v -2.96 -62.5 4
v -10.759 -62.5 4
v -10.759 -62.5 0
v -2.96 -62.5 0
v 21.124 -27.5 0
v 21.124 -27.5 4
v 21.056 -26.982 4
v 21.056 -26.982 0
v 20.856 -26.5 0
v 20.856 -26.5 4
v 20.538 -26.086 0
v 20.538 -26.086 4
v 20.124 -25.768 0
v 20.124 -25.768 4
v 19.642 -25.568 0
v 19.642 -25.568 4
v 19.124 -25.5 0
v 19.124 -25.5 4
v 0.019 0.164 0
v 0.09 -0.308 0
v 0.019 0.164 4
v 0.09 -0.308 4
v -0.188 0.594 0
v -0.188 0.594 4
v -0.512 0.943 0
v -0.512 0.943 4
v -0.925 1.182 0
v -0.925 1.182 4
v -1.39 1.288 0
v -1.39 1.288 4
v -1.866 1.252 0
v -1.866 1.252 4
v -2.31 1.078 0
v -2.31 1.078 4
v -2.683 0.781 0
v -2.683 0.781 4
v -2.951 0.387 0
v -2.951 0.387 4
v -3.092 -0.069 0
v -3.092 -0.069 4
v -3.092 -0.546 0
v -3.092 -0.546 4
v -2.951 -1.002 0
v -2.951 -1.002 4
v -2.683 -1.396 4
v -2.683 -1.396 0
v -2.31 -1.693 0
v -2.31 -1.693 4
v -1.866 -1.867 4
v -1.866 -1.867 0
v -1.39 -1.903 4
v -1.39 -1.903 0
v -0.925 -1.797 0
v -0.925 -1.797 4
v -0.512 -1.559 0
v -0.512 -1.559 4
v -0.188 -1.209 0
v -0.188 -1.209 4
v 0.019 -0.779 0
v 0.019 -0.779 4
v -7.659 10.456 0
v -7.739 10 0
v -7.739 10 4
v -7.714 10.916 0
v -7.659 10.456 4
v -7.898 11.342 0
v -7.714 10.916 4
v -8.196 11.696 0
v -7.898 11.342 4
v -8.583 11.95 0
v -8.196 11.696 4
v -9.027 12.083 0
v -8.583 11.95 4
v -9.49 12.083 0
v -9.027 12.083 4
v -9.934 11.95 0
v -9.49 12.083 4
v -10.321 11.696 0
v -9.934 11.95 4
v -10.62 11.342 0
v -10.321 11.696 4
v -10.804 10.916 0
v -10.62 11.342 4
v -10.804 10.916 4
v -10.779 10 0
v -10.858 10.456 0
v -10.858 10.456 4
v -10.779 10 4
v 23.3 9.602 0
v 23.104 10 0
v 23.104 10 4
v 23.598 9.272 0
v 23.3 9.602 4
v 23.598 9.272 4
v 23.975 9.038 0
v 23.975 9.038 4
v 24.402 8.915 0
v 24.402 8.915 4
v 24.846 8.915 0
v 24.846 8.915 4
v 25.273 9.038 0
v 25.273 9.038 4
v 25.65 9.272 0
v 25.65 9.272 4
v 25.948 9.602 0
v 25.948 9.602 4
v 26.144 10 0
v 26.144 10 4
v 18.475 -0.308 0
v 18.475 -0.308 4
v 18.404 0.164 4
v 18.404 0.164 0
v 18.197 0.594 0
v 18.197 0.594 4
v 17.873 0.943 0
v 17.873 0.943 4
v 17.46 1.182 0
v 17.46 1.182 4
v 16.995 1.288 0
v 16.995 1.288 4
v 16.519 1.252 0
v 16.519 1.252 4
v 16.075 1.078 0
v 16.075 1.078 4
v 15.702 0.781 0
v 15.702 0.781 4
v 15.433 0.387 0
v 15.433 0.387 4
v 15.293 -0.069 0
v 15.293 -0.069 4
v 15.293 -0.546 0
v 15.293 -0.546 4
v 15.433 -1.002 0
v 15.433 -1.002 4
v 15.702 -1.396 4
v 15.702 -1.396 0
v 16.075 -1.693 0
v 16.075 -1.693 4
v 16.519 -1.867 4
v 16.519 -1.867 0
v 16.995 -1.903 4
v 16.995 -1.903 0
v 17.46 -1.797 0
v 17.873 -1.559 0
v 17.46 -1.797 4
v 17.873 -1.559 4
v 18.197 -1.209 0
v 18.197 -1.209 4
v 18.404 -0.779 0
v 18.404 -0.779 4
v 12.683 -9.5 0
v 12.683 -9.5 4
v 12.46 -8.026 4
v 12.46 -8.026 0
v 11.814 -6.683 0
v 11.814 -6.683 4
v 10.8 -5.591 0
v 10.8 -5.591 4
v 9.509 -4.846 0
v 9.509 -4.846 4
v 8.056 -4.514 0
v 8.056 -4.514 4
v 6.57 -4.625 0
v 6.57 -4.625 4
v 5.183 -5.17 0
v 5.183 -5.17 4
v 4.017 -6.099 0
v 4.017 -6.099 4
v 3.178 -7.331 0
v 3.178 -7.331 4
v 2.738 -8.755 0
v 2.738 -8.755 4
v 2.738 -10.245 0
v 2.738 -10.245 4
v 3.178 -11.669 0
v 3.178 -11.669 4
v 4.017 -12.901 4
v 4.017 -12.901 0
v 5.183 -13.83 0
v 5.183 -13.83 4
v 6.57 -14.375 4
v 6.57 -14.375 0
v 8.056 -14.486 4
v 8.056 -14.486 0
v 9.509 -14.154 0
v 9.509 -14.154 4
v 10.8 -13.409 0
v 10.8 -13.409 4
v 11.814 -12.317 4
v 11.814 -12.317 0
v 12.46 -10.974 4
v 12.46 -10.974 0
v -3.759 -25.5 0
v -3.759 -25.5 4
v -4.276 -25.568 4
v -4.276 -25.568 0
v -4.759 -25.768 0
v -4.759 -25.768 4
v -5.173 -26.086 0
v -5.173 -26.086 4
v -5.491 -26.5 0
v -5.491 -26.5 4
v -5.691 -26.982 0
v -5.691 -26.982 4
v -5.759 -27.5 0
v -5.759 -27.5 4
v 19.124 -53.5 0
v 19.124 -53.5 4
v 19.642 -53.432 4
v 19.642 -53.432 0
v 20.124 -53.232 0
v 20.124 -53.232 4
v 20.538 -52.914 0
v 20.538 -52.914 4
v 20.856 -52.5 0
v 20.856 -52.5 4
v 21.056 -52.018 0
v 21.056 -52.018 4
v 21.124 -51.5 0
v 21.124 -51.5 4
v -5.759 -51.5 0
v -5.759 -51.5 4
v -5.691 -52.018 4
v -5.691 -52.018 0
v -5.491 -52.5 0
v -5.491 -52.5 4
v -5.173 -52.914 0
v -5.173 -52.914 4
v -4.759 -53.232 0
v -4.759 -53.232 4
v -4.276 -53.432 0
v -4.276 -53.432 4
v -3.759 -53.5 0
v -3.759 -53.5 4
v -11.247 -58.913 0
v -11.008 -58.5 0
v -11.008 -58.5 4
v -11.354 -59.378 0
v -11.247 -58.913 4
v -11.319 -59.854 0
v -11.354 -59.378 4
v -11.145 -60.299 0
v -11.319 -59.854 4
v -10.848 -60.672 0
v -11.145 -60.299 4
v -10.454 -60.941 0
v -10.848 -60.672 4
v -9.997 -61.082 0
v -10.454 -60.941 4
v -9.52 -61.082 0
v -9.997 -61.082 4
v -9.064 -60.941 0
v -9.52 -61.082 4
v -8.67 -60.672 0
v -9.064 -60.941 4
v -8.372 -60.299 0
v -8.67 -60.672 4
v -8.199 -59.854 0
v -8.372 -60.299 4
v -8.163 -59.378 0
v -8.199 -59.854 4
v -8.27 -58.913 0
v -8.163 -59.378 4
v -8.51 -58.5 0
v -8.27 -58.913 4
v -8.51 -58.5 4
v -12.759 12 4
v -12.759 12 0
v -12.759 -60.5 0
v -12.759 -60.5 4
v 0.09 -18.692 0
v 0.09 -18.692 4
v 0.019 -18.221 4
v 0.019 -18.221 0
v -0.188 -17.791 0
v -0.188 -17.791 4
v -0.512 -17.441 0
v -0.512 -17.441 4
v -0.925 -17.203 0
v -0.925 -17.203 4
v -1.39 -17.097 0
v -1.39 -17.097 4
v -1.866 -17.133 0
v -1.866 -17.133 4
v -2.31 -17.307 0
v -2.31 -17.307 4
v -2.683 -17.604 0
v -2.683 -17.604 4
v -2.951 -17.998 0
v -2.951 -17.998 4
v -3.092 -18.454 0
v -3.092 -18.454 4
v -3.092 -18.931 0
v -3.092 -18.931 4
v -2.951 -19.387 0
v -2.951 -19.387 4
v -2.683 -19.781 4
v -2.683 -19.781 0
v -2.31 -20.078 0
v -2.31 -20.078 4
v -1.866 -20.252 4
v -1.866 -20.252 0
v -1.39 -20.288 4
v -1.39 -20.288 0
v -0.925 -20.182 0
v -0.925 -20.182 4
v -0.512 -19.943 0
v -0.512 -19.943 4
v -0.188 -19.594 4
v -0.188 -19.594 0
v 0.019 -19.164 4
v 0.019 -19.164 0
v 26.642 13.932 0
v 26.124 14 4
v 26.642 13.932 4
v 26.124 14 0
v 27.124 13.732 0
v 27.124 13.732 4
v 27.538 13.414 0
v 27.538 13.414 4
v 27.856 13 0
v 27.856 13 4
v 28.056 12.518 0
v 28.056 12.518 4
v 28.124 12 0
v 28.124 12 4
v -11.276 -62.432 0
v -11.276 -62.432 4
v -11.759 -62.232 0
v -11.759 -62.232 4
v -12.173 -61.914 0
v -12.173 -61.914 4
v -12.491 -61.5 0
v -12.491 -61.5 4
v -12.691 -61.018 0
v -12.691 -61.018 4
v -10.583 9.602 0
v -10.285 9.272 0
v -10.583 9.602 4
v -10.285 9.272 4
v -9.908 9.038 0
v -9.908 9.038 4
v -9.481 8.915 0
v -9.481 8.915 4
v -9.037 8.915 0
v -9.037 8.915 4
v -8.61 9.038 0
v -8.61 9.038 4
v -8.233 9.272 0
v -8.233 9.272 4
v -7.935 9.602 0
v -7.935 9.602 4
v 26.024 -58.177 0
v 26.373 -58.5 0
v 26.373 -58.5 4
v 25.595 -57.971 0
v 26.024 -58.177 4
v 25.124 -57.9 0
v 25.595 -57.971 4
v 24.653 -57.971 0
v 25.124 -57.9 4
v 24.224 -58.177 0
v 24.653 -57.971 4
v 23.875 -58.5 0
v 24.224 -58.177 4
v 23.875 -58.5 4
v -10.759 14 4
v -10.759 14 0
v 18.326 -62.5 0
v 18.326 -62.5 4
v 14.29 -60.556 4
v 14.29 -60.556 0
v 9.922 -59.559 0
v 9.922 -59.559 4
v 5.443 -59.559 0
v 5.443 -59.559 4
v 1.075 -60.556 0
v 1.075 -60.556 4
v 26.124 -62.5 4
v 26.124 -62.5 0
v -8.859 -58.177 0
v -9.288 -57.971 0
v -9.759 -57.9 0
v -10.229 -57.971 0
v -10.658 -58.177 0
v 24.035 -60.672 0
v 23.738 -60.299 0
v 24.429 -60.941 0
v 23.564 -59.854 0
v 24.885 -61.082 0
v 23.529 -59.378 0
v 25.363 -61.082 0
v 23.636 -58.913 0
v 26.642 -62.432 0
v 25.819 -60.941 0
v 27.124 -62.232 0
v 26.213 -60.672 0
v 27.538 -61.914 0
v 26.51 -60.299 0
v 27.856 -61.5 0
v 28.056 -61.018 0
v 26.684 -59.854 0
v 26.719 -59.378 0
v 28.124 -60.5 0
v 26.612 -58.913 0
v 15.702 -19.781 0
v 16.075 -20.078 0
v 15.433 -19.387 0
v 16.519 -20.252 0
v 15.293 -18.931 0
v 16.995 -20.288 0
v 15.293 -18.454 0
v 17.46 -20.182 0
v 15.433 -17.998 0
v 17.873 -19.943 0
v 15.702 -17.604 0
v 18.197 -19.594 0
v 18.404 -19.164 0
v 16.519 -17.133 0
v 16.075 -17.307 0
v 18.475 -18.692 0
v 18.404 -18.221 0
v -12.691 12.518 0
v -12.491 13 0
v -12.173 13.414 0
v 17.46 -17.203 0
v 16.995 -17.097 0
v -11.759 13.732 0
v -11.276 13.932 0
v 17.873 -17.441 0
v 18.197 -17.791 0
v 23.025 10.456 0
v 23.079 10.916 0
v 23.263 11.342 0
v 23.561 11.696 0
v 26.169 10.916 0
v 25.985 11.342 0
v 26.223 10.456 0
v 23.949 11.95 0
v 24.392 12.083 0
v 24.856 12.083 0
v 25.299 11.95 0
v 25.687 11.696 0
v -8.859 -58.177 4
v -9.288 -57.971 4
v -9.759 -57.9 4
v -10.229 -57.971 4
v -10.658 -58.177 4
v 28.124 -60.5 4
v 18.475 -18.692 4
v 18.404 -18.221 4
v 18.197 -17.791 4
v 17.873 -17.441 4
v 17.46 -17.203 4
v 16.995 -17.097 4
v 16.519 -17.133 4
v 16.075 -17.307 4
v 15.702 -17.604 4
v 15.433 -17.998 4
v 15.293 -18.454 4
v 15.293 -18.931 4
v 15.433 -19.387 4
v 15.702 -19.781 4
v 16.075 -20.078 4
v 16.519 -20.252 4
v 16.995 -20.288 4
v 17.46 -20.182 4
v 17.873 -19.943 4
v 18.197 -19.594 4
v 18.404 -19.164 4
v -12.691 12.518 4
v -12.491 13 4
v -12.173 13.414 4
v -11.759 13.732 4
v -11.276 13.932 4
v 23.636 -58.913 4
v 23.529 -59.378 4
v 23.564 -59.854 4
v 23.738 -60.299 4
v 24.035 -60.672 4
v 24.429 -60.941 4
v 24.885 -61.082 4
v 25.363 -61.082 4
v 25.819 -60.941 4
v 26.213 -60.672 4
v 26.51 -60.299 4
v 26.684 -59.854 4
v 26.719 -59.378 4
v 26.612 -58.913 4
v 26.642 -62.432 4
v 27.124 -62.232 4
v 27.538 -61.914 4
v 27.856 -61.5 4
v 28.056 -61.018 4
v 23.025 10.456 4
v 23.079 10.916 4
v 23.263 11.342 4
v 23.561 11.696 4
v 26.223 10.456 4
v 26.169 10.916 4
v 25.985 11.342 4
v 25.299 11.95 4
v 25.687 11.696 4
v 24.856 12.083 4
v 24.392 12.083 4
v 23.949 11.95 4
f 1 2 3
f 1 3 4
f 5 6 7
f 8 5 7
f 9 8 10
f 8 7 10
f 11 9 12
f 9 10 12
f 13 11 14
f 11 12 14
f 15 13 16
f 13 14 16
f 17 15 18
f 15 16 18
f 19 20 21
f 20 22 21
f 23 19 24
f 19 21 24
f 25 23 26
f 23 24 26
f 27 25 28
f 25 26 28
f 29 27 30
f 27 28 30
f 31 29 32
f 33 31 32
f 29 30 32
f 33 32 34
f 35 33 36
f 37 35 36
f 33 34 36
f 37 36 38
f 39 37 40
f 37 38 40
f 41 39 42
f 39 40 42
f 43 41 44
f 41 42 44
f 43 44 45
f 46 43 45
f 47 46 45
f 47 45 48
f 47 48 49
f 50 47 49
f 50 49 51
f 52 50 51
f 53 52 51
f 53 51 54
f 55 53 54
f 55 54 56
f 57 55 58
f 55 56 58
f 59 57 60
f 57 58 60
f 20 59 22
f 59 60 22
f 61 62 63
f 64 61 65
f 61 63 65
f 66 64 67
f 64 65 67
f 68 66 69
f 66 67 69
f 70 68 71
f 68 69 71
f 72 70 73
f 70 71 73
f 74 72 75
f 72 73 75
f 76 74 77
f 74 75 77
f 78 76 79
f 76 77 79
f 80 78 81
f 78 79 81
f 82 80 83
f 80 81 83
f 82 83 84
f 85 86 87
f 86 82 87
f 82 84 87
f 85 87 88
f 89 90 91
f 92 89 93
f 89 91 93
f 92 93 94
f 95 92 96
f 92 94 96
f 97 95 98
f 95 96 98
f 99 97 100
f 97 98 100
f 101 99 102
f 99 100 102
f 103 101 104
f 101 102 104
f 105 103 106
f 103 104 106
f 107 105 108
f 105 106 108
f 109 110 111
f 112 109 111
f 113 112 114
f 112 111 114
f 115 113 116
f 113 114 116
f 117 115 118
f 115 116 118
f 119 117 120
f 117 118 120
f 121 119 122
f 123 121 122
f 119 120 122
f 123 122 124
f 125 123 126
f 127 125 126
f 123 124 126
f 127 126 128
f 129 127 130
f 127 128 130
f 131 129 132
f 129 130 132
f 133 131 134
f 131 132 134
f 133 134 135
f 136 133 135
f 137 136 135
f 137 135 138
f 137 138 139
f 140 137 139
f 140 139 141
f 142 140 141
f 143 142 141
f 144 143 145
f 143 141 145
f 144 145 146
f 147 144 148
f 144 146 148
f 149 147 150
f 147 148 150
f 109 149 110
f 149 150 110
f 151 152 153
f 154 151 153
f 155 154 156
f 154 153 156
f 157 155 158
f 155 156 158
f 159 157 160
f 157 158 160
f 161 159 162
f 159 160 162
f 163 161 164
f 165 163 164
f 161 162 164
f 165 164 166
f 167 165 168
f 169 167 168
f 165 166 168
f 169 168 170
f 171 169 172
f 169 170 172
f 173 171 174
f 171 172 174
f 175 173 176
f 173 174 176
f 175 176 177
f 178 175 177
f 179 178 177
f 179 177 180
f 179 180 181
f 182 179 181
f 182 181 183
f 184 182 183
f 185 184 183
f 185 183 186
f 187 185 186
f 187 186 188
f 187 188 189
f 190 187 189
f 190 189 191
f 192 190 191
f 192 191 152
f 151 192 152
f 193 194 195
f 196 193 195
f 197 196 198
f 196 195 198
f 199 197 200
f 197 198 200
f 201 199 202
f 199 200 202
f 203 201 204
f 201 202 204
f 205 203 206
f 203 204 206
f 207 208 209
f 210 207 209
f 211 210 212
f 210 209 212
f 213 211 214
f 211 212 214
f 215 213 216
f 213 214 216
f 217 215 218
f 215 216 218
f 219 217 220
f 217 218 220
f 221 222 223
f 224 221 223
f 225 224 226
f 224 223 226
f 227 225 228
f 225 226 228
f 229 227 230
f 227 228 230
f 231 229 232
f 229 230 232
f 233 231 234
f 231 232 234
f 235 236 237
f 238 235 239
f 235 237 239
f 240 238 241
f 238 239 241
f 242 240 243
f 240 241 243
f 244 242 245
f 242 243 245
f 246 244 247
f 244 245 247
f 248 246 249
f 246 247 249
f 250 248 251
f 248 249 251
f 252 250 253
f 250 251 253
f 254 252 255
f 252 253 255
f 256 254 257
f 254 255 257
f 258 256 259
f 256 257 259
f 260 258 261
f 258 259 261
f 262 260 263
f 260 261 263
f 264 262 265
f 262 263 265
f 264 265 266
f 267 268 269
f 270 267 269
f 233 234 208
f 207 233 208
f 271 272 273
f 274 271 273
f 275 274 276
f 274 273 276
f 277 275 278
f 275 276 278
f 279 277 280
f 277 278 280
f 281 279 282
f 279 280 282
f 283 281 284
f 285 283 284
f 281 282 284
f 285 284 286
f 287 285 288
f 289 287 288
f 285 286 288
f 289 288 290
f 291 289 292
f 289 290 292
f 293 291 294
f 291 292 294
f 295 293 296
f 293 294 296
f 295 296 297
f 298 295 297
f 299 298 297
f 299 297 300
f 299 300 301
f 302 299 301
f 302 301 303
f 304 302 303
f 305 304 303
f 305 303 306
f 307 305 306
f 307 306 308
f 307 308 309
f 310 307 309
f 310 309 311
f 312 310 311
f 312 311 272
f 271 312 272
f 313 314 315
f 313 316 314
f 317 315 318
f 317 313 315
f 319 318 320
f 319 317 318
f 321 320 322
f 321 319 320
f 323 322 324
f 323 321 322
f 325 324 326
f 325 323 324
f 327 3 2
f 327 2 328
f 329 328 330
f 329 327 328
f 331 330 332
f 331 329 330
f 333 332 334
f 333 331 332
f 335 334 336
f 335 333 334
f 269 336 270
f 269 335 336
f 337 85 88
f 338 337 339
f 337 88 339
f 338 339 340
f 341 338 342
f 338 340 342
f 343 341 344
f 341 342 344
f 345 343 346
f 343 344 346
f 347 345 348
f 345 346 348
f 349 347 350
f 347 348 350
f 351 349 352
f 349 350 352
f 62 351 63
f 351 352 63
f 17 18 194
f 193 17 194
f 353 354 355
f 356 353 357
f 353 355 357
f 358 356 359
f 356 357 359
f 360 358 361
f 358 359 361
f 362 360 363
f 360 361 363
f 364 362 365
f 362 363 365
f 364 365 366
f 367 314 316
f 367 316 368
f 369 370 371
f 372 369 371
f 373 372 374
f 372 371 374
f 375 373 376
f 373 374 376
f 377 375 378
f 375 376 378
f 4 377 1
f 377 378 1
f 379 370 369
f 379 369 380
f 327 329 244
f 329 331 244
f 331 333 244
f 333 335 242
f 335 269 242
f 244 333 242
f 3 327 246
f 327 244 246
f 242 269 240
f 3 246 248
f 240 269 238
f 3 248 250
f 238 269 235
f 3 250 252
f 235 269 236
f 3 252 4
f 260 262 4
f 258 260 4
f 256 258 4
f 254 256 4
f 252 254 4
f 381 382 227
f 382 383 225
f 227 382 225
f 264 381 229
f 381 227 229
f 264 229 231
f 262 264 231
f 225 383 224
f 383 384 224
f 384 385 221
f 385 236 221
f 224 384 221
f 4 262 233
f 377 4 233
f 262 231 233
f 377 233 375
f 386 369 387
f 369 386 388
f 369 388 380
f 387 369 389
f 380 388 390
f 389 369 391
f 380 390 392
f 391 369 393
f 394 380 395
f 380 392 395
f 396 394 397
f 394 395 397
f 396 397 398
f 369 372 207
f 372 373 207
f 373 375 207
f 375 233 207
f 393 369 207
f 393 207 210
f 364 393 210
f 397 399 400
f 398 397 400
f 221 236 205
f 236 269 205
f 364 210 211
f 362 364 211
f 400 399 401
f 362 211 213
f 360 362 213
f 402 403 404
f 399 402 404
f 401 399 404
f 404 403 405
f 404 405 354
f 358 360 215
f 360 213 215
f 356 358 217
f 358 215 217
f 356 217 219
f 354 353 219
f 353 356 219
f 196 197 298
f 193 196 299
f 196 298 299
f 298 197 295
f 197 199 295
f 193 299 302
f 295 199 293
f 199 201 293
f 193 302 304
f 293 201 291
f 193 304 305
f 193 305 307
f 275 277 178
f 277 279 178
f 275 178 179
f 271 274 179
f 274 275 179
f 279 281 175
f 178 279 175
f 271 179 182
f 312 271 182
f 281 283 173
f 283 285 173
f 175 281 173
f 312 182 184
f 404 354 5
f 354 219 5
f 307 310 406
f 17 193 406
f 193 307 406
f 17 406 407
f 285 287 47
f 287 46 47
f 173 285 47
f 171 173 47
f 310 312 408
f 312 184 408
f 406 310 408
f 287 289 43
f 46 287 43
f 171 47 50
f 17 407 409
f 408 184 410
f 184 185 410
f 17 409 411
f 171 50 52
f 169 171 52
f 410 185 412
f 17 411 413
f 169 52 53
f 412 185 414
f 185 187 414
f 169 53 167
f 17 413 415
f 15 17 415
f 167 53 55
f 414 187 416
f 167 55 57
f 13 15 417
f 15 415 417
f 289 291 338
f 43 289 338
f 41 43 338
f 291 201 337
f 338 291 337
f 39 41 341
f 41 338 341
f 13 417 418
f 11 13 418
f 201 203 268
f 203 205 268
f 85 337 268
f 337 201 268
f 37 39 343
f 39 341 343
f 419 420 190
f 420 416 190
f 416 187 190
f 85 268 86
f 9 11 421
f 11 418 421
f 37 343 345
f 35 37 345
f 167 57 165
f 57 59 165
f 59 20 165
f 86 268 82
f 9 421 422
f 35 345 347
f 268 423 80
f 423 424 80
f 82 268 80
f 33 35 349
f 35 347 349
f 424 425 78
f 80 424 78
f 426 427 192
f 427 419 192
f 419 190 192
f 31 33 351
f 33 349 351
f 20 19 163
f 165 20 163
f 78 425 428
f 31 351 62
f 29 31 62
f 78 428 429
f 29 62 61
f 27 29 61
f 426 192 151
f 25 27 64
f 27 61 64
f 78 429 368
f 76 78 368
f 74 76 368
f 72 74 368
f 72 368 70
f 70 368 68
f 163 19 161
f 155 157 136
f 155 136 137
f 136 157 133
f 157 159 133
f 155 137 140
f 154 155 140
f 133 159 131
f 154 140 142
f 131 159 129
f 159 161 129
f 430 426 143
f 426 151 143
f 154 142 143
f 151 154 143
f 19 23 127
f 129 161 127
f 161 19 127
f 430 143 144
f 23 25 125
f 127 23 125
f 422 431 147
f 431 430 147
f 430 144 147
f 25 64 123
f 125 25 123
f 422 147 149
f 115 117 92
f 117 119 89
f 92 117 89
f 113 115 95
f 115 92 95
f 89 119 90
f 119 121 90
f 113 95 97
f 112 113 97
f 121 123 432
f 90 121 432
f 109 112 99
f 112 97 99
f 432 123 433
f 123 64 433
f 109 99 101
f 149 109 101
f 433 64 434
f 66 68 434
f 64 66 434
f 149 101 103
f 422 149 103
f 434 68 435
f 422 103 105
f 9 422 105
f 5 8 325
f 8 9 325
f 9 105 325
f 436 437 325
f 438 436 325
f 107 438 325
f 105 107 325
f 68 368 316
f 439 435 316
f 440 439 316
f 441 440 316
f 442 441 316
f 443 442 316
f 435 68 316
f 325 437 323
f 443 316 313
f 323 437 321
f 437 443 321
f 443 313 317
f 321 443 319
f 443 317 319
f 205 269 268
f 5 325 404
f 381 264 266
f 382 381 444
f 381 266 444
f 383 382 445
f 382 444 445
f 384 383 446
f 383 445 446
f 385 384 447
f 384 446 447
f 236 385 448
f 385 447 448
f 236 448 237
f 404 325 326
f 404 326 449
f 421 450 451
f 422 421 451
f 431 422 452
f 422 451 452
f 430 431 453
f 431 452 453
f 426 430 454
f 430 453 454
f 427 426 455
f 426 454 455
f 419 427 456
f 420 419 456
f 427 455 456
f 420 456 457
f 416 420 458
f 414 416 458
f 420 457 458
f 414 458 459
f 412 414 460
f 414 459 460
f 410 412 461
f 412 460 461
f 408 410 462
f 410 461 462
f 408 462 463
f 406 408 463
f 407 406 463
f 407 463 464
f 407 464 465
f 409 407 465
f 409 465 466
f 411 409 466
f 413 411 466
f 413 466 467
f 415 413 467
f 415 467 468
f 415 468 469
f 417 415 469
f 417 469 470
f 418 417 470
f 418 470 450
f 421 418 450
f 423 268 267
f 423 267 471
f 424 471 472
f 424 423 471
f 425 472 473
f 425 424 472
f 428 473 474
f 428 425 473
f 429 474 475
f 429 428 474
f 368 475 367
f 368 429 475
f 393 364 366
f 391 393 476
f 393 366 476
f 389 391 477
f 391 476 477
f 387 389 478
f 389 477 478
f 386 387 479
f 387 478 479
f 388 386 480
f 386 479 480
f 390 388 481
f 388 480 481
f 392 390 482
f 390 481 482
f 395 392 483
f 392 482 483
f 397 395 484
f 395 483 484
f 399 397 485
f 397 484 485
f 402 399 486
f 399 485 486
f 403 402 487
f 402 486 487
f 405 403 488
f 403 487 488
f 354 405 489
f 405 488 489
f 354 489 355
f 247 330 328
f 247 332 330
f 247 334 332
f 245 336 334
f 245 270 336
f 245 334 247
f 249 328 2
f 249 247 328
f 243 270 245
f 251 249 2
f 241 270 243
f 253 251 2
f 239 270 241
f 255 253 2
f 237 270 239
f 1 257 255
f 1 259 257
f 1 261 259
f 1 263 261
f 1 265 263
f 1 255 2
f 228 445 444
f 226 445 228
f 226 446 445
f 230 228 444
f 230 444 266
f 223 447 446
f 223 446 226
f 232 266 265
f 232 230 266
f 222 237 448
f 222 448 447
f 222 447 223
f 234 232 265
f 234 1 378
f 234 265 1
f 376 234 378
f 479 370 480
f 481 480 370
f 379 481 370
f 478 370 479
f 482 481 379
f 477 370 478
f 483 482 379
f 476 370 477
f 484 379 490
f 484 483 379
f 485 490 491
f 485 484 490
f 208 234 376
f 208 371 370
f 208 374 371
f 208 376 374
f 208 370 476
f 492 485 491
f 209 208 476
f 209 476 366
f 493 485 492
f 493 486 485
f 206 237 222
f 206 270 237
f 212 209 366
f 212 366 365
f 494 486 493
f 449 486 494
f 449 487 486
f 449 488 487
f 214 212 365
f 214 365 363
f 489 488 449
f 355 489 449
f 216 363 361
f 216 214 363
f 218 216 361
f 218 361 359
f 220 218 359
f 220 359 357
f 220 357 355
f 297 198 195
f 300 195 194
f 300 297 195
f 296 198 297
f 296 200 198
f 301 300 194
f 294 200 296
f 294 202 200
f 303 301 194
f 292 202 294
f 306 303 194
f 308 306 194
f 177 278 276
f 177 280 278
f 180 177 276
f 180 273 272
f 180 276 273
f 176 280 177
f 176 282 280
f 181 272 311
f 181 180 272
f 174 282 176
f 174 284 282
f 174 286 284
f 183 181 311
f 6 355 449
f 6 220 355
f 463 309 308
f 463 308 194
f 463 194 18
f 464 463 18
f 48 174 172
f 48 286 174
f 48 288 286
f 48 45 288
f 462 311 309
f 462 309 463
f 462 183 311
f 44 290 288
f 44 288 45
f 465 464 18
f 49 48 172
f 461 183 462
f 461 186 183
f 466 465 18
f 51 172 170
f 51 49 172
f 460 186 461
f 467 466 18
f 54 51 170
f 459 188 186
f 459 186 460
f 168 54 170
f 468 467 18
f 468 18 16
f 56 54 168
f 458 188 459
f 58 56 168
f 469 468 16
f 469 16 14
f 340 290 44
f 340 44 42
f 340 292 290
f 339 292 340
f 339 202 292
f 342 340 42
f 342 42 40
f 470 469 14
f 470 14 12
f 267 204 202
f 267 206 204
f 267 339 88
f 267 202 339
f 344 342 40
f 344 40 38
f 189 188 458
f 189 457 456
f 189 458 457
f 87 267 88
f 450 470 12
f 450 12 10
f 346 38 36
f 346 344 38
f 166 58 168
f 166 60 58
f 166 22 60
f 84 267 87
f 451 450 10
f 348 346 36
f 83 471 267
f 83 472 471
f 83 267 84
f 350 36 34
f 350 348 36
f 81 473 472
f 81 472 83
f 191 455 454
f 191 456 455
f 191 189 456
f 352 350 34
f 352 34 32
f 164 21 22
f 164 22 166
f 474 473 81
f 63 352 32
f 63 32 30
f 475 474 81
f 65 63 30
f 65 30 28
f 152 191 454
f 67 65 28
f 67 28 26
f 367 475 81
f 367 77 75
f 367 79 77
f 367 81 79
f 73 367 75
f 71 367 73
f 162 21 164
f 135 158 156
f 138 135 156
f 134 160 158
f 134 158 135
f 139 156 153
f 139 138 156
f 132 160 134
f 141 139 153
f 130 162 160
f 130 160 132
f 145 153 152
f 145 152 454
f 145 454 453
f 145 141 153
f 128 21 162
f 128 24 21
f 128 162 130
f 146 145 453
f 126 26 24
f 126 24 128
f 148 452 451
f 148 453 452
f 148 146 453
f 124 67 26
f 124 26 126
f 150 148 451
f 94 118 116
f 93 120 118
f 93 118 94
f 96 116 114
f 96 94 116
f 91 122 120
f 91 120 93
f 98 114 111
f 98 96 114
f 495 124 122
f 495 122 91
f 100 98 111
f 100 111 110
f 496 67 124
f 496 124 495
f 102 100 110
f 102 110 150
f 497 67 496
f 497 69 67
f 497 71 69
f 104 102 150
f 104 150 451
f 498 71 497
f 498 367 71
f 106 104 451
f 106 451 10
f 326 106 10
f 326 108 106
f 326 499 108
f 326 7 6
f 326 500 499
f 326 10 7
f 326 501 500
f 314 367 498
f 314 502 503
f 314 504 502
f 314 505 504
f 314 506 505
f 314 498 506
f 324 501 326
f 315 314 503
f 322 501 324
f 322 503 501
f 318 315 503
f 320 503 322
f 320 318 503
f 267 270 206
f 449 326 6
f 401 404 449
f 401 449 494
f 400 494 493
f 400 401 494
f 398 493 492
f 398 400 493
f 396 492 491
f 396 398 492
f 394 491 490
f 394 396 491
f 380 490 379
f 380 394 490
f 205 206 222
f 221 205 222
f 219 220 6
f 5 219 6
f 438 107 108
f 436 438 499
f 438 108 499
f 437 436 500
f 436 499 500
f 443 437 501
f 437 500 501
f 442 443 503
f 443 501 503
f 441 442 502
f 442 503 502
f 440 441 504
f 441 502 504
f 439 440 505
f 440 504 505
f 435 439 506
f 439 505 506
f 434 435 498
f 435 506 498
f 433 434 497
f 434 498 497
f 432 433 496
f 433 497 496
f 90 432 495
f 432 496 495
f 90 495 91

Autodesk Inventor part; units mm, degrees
ref_plane "YZ Plane" through (0, 0, 0) normal (1, 0, 0) x (0, 1, 0)
ref_plane "XZ Plane" through (0, 0, 0) normal (0, 1, 0) x (-1, 0, 0)
ref_plane "XY Plane" through (0, 0, 0) normal (0, 0, 1) x (1, 0, 0)
sketch "스케치1" plane through (0, 0, 0) normal (0, 0, 1) x (1, 0, 0)
  line L0 (28.124, 3.5) -> (28.124, -58.5)
  line L1 (-12.7588, 3.5) -> (-12.7588, -58.5)
  line L2 (-12.7588, -58.5) -> (28.124, -58.5)
  line L3 (-12.7588, 3.5) -> (-12.7588, 4.4)
  line L4 (28.124, 4.4) -> (28.124, 3.5)
  line L5 (-12.7588, 4.4) -> (-12.7588, 10)
  line L6 (-12.7588, 10) -> (28.124, 10)
  line L7 (28.124, 10) -> (28.124, 4.4)
  dimension "d16" = 68.5
  dimension "d50" = 40.8828
extrude "돌출2" add sketch "스케치1" along normal blind 4
sketch "스케치4" plane through (0, 0, 4) normal (0, 0, 1) x (1, 0, 0)
  circle A0 centre (7.6826, -9.5) radius 5
  point P0 (0, 0)
sketch "스케치6" plane through (0, 0, 4) normal (0, 0, 1) x (1, 0, 0)
  circle A0 centre (7.6826, -9.5) radius 13 construction
  line L0 (7.6826, -9.5) -> (-1.5098, -0.3076) construction
  line L1 (7.6826, -9.5) -> (20.6826, -9.5) construction
  line L2 (7.6826, -9.5) -> (-1.5098, -18.6924) construction
  line L3 (7.6826, -9.5) -> (20.6826, -9.5) construction
  circle A1 centre (-1.5098, -0.3076) radius 1.6
  circle A2 centre (-1.5098, -18.6924) radius 1.6
  circle A3 centre (7.6826, -9.5) radius 5 projected
  circle A4 centre (16.875, -0.3076) radius 1.6
  line L4 (7.6826, -9.5) -> (16.875, -18.6924) construction
  circle A5 centre (16.875, -18.6924) radius 1.6
  point P0 (0, 0)
  dimension "d51" = 26
  dimension "d52" = 135
  dimension "d53" = 135
  dimension "d54" = 3.2
  dimension "d55" = 3.2
  dimension "d56" = 3.2
  dimension "d57" = 3.2
extrude "돌출4" cut sketch "스케치6" against normal up to surface (4 mm away)
sketch "스케치5" plane through (0, 0, 4) normal (0, 0, 1) x (1, 0, 0)
  line L0 (-12.7588, 10) -> (-12.7588, -58.5) projected
  line L1 (-12.7588, -58.5) -> (28.124, -58.5) projected
  line L2 (28.124, -58.5) -> (28.124, 10) projected
  line L3 (28.124, 10) -> (-12.7588, 10) projected
  circle A0 centre (-9.7588, -59.5) radius 1.6
  circle A1 centre (25.124, -59.5) radius 1.6
  circle A2 centre (-9.2588, 10.5) radius 1.6
  circle A3 centre (24.624, 10.5) radius 1.6
  line L4 (28.124, 10) -> (28.124, 14)
  line L5 (28.124, -58.5) -> (28.124, 10) projected
  line L6 (28.124, -58.5) -> (28.124, -62.5)
  point P0 (0, 0)
  dimension "d36" = 3.2
  dimension "d37" = 3.2
  dimension "d38" = 3.2
  dimension "d39" = 3.2
  dimension "d40" = 3
  dimension "d42" = 3.5
  dimension "d44" = 3.5
  dimension "d46" = 3
  dimension "d64" = 4
  dimension "d65" = 3.5
  dimension "d66" = 3.5
  dimension "d67" = 4
  dimension "d68" = 3
  dimension "d69" = 3
extrude "돌출3" cut sketch "스케치5" against normal up to surface (4 mm away) contours A2 L3 | L3 A2 | A0 L1 | L1 A0 | A3 L3 | L3 A3 | A1 L1 | L1 A1
sketch "스케치7" plane through (0, 0, 4) normal (0, 0, 1) x (1, 0, 0)
  line L0 (-12.7588, 10) -> (-12.7588, 14)
  arc A0 (23.1041, 10) -> (26.1439, 10) centre (24.624, 10.5) ccw projected
  arc A1 (26.373, -58.5) -> (23.875, -58.5) centre (25.124, -59.5) ccw projected
  arc A2 (-10.7787, 10) -> (-7.7389, 10) centre (-9.2588, 10.5) ccw projected
  arc A3 (-8.5098, -58.5) -> (-11.0078, -58.5) centre (-9.7588, -59.5) ccw projected
  circle A4 centre (16.875, -0.3076) radius 1.6 projected
  circle A5 centre (-1.5098, -18.6924) radius 1.6 projected
  circle A6 centre (7.6826, -9.5) radius 5 projected
  circle A7 centre (16.875, -18.6924) radius 1.6 projected
  circle A8 centre (-1.5098, -0.3076) radius 1.6 projected
  line L1 (-12.7588, -58.5) -> (-11.0078, -58.5) projected
  line L2 (28.124, -58.5) -> (28.124, 10) projected
  line L3 (28.124, 10) -> (26.1439, 10) projected
  line L4 (-12.7588, 10) -> (-12.7588, -58.5) projected
  line L5 (28.124, 10) -> (28.124, 14)
  line L6 (28.124, 14) -> (-12.7588, 14)
  line L7 (28.124, -58.5) -> (28.124, 10) projected
  line L8 (-12.7588, -58.5) -> (28.124, -58.5) projected
  line L9 (28.124, -58.5) -> (-12.7588, -58.5)
  line L10 (-12.7588, -58.5) -> (-12.7588, -62.5)
  line L11 (-12.7588, -62.5) -> (28.124, -62.5)
  line L12 (28.124, -62.5) -> (28.124, -58.5)
  line L13 (23.1041, 10) -> (-7.7389, 10) projected
  line L14 (-10.7787, 10) -> (-12.7588, 10) projected
  line L15 (-8.5098, -58.5) -> (23.875, -58.5) projected
  line L16 (26.373, -58.5) -> (28.124, -58.5) projected
  circle A9 centre (24.624, 10.5) radius 1.6
  arc A10 (-10.7787, 10) -> (-7.7389, 10) centre (-9.2588, 10.5) ccw projected
  circle A11 centre (-9.2588, 10.5) radius 1.6
  circle A12 centre (25.124, -59.5) radius 1.6
  arc A13 (-8.5098, -58.5) -> (-11.0078, -58.5) centre (-9.7588, -59.5) ccw projected
  circle A14 centre (-9.7588, -59.5) radius 1.6
  point P0 (0, 0)
  point P1 (26.373, -58.5)
  point P2 (23.875, -58.5)
  point P3 (-7.7389, 10)
  dimension "d60" = 4
  dimension "d61" = 4
extrude "돌출6" add sketch "스케치7" against normal up to surface (4 mm away) contours L0 L6 L5 L3 A9 L13 A11 L14 | L1 A14 L8 A12 L12 L11 L10
fillet "모깎기3" radius 2 4 edges at (28.124, 14, 2) (-12.7588, 14, 2) (-12.7588, -62.5, 2) (28.124, -62.5, 2)
sketch "스케치10" plane through (0, 0, 4) normal (0, 0, 1) x (1, 0, 0)
  line L0 (-3.7588, -53.5) -> (19.124, -53.5)
  line L1 (21.124, -51.5) -> (21.124, -27.5)
  line L2 (19.124, -25.5) -> (-3.7588, -25.5)
  line L3 (-5.7588, -27.5) -> (-5.7588, -51.5)
  circle A0 centre (-9.7588, -59.5) radius 1.6 projected
  line L4 (28.124, -60.5) -> (28.124, 12) projected
  line L5 (-12.7588, 12) -> (-12.7588, -60.5) projected
  circle A1 centre (25.124, -59.5) radius 1.6 projected
  circle A2 centre (24.624, 10.5) radius 1.6 projected
  circle A3 centre (-9.2588, 10.5) radius 1.6 projected
  circle A4 centre (16.875, -0.3076) radius 1.6 projected
  circle A5 centre (-1.5098, -18.6924) radius 1.6 projected
  circle A6 centre (7.6826, -9.5) radius 5 projected
  circle A7 centre (16.875, -18.6924) radius 1.6 projected
  circle A8 centre (-1.5098, -0.3076) radius 1.6 projected
  arc A9 (-5.7588, -51.5) -> (-3.7588, -53.5) centre (-3.7588, -51.5) ccw
  arc A10 (19.124, -53.5) -> (21.124, -51.5) centre (19.124, -51.5) ccw
  arc A11 (21.124, -27.5) -> (19.124, -25.5) centre (19.124, -27.5) ccw
  arc A12 (-3.7588, -25.5) -> (-5.7588, -27.5) centre (-3.7588, -27.5) ccw
  arc A13 (26.124, -62.5) -> (28.124, -60.5) centre (26.124, -60.5) ccw projected
  arc A14 (28.124, 12) -> (26.124, 14) centre (26.124, 12) ccw projected
  line L6 (26.124, 14) -> (-10.7588, 14) projected
  arc A15 (-10.7588, 14) -> (-12.7588, 12) centre (-10.7588, 12) ccw projected
  arc A16 (-12.7588, -60.5) -> (-10.7588, -62.5) centre (-10.7588, -60.5) ccw projected
  line L7 (-10.7588, -62.5) -> (26.124, -62.5) projected
  point P0 (0, 0)
  point P1 (-5.7588, -53.5)
  point P2 (21.124, -25.5)
  point P3 (21.124, -53.5)
  point P4 (-5.7588, -25.5)
  dimension "d84" = 16
  dimension "d87" = 7
  dimension "d88" = 7
  dimension "d89" = 2
extrude "돌출7" cut sketch "스케치10" against normal up to surface (4 mm away) contours A9 L3 A12 L2 A11 L1 A10 L0
sketch "스케치11" plane through (0, 0, 4) normal (0, 0, 1) x (1, 0, 0)
  line L0 (-10.7588, 14) -> (26.124, 14) projected
  line L1 (7.6826, 14) -> (7.6826, -136) construction
  circle A0 centre (7.6826, -79.433) radius 20
  arc A1 (21.124, -27.5) -> (19.124, -25.5) centre (19.124, -27.5) ccw projected
  line L2 (21.124, -27.5) -> (21.124, -51.5) projected
  arc A2 (19.124, -53.5) -> (21.124, -51.5) centre (19.124, -51.5) ccw projected
  line L3 (19.124, -53.5) -> (-3.7588, -53.5) projected
  arc A3 (-5.7588, -51.5) -> (-3.7588, -53.5) centre (-3.7588, -51.5) ccw projected
  line L4 (-5.7588, -51.5) -> (-5.7588, -27.5) projected
  arc A4 (-3.7588, -25.5) -> (-5.7588, -27.5) centre (-3.7588, -27.5) ccw projected
  line L5 (-3.7588, -25.5) -> (19.124, -25.5) projected
  circle A5 centre (25.124, -59.5) radius 1.6 projected
  circle A6 centre (-9.7588, -59.5) radius 1.6 projected
  line L6 (28.124, -60.5) -> (28.124, 12) projected
  line L7 (-12.7588, 12) -> (-12.7588, -60.5) projected
  circle A7 centre (24.624, 10.5) radius 1.6 projected
  circle A8 centre (-9.2588, 10.5) radius 1.6 projected
  circle A9 centre (16.875, -0.3076) radius 1.6 projected
  circle A10 centre (-1.5098, -18.6924) radius 1.6 projected
  circle A11 centre (7.6826, -9.5) radius 5 projected
  circle A12 centre (16.875, -18.6924) radius 1.6 projected
  circle A13 centre (-1.5098, -0.3076) radius 1.6 projected
  arc A14 (26.124, -62.5) -> (28.124, -60.5) centre (26.124, -60.5) ccw projected
  arc A15 (28.124, 12) -> (26.124, 14) centre (26.124, 12) ccw projected
  line L8 (26.124, 14) -> (-10.7588, 14) projected
  arc A16 (-10.7588, 14) -> (-12.7588, 12) centre (-10.7588, 12) ccw projected
  arc A17 (-12.7588, -60.5) -> (-10.7588, -62.5) centre (-10.7588, -60.5) ccw projected
  line L9 (-10.7588, -62.5) -> (26.124, -62.5) projected
  point P0 (0, 0)
  point P1 (-2.9604, -62.5)
  point P2 (18.3256, -62.5)
  dimension "d90" = 150
  dimension "d91" = 40
  dimension "d92" = 25.933
extrude "돌출8" cut sketch "스케치11" against normal up to surface (4 mm away) contours A0 L9 picked at (6.936, -61.5196)
properties part number "링크2고정부" material "알루미늄 6061"
